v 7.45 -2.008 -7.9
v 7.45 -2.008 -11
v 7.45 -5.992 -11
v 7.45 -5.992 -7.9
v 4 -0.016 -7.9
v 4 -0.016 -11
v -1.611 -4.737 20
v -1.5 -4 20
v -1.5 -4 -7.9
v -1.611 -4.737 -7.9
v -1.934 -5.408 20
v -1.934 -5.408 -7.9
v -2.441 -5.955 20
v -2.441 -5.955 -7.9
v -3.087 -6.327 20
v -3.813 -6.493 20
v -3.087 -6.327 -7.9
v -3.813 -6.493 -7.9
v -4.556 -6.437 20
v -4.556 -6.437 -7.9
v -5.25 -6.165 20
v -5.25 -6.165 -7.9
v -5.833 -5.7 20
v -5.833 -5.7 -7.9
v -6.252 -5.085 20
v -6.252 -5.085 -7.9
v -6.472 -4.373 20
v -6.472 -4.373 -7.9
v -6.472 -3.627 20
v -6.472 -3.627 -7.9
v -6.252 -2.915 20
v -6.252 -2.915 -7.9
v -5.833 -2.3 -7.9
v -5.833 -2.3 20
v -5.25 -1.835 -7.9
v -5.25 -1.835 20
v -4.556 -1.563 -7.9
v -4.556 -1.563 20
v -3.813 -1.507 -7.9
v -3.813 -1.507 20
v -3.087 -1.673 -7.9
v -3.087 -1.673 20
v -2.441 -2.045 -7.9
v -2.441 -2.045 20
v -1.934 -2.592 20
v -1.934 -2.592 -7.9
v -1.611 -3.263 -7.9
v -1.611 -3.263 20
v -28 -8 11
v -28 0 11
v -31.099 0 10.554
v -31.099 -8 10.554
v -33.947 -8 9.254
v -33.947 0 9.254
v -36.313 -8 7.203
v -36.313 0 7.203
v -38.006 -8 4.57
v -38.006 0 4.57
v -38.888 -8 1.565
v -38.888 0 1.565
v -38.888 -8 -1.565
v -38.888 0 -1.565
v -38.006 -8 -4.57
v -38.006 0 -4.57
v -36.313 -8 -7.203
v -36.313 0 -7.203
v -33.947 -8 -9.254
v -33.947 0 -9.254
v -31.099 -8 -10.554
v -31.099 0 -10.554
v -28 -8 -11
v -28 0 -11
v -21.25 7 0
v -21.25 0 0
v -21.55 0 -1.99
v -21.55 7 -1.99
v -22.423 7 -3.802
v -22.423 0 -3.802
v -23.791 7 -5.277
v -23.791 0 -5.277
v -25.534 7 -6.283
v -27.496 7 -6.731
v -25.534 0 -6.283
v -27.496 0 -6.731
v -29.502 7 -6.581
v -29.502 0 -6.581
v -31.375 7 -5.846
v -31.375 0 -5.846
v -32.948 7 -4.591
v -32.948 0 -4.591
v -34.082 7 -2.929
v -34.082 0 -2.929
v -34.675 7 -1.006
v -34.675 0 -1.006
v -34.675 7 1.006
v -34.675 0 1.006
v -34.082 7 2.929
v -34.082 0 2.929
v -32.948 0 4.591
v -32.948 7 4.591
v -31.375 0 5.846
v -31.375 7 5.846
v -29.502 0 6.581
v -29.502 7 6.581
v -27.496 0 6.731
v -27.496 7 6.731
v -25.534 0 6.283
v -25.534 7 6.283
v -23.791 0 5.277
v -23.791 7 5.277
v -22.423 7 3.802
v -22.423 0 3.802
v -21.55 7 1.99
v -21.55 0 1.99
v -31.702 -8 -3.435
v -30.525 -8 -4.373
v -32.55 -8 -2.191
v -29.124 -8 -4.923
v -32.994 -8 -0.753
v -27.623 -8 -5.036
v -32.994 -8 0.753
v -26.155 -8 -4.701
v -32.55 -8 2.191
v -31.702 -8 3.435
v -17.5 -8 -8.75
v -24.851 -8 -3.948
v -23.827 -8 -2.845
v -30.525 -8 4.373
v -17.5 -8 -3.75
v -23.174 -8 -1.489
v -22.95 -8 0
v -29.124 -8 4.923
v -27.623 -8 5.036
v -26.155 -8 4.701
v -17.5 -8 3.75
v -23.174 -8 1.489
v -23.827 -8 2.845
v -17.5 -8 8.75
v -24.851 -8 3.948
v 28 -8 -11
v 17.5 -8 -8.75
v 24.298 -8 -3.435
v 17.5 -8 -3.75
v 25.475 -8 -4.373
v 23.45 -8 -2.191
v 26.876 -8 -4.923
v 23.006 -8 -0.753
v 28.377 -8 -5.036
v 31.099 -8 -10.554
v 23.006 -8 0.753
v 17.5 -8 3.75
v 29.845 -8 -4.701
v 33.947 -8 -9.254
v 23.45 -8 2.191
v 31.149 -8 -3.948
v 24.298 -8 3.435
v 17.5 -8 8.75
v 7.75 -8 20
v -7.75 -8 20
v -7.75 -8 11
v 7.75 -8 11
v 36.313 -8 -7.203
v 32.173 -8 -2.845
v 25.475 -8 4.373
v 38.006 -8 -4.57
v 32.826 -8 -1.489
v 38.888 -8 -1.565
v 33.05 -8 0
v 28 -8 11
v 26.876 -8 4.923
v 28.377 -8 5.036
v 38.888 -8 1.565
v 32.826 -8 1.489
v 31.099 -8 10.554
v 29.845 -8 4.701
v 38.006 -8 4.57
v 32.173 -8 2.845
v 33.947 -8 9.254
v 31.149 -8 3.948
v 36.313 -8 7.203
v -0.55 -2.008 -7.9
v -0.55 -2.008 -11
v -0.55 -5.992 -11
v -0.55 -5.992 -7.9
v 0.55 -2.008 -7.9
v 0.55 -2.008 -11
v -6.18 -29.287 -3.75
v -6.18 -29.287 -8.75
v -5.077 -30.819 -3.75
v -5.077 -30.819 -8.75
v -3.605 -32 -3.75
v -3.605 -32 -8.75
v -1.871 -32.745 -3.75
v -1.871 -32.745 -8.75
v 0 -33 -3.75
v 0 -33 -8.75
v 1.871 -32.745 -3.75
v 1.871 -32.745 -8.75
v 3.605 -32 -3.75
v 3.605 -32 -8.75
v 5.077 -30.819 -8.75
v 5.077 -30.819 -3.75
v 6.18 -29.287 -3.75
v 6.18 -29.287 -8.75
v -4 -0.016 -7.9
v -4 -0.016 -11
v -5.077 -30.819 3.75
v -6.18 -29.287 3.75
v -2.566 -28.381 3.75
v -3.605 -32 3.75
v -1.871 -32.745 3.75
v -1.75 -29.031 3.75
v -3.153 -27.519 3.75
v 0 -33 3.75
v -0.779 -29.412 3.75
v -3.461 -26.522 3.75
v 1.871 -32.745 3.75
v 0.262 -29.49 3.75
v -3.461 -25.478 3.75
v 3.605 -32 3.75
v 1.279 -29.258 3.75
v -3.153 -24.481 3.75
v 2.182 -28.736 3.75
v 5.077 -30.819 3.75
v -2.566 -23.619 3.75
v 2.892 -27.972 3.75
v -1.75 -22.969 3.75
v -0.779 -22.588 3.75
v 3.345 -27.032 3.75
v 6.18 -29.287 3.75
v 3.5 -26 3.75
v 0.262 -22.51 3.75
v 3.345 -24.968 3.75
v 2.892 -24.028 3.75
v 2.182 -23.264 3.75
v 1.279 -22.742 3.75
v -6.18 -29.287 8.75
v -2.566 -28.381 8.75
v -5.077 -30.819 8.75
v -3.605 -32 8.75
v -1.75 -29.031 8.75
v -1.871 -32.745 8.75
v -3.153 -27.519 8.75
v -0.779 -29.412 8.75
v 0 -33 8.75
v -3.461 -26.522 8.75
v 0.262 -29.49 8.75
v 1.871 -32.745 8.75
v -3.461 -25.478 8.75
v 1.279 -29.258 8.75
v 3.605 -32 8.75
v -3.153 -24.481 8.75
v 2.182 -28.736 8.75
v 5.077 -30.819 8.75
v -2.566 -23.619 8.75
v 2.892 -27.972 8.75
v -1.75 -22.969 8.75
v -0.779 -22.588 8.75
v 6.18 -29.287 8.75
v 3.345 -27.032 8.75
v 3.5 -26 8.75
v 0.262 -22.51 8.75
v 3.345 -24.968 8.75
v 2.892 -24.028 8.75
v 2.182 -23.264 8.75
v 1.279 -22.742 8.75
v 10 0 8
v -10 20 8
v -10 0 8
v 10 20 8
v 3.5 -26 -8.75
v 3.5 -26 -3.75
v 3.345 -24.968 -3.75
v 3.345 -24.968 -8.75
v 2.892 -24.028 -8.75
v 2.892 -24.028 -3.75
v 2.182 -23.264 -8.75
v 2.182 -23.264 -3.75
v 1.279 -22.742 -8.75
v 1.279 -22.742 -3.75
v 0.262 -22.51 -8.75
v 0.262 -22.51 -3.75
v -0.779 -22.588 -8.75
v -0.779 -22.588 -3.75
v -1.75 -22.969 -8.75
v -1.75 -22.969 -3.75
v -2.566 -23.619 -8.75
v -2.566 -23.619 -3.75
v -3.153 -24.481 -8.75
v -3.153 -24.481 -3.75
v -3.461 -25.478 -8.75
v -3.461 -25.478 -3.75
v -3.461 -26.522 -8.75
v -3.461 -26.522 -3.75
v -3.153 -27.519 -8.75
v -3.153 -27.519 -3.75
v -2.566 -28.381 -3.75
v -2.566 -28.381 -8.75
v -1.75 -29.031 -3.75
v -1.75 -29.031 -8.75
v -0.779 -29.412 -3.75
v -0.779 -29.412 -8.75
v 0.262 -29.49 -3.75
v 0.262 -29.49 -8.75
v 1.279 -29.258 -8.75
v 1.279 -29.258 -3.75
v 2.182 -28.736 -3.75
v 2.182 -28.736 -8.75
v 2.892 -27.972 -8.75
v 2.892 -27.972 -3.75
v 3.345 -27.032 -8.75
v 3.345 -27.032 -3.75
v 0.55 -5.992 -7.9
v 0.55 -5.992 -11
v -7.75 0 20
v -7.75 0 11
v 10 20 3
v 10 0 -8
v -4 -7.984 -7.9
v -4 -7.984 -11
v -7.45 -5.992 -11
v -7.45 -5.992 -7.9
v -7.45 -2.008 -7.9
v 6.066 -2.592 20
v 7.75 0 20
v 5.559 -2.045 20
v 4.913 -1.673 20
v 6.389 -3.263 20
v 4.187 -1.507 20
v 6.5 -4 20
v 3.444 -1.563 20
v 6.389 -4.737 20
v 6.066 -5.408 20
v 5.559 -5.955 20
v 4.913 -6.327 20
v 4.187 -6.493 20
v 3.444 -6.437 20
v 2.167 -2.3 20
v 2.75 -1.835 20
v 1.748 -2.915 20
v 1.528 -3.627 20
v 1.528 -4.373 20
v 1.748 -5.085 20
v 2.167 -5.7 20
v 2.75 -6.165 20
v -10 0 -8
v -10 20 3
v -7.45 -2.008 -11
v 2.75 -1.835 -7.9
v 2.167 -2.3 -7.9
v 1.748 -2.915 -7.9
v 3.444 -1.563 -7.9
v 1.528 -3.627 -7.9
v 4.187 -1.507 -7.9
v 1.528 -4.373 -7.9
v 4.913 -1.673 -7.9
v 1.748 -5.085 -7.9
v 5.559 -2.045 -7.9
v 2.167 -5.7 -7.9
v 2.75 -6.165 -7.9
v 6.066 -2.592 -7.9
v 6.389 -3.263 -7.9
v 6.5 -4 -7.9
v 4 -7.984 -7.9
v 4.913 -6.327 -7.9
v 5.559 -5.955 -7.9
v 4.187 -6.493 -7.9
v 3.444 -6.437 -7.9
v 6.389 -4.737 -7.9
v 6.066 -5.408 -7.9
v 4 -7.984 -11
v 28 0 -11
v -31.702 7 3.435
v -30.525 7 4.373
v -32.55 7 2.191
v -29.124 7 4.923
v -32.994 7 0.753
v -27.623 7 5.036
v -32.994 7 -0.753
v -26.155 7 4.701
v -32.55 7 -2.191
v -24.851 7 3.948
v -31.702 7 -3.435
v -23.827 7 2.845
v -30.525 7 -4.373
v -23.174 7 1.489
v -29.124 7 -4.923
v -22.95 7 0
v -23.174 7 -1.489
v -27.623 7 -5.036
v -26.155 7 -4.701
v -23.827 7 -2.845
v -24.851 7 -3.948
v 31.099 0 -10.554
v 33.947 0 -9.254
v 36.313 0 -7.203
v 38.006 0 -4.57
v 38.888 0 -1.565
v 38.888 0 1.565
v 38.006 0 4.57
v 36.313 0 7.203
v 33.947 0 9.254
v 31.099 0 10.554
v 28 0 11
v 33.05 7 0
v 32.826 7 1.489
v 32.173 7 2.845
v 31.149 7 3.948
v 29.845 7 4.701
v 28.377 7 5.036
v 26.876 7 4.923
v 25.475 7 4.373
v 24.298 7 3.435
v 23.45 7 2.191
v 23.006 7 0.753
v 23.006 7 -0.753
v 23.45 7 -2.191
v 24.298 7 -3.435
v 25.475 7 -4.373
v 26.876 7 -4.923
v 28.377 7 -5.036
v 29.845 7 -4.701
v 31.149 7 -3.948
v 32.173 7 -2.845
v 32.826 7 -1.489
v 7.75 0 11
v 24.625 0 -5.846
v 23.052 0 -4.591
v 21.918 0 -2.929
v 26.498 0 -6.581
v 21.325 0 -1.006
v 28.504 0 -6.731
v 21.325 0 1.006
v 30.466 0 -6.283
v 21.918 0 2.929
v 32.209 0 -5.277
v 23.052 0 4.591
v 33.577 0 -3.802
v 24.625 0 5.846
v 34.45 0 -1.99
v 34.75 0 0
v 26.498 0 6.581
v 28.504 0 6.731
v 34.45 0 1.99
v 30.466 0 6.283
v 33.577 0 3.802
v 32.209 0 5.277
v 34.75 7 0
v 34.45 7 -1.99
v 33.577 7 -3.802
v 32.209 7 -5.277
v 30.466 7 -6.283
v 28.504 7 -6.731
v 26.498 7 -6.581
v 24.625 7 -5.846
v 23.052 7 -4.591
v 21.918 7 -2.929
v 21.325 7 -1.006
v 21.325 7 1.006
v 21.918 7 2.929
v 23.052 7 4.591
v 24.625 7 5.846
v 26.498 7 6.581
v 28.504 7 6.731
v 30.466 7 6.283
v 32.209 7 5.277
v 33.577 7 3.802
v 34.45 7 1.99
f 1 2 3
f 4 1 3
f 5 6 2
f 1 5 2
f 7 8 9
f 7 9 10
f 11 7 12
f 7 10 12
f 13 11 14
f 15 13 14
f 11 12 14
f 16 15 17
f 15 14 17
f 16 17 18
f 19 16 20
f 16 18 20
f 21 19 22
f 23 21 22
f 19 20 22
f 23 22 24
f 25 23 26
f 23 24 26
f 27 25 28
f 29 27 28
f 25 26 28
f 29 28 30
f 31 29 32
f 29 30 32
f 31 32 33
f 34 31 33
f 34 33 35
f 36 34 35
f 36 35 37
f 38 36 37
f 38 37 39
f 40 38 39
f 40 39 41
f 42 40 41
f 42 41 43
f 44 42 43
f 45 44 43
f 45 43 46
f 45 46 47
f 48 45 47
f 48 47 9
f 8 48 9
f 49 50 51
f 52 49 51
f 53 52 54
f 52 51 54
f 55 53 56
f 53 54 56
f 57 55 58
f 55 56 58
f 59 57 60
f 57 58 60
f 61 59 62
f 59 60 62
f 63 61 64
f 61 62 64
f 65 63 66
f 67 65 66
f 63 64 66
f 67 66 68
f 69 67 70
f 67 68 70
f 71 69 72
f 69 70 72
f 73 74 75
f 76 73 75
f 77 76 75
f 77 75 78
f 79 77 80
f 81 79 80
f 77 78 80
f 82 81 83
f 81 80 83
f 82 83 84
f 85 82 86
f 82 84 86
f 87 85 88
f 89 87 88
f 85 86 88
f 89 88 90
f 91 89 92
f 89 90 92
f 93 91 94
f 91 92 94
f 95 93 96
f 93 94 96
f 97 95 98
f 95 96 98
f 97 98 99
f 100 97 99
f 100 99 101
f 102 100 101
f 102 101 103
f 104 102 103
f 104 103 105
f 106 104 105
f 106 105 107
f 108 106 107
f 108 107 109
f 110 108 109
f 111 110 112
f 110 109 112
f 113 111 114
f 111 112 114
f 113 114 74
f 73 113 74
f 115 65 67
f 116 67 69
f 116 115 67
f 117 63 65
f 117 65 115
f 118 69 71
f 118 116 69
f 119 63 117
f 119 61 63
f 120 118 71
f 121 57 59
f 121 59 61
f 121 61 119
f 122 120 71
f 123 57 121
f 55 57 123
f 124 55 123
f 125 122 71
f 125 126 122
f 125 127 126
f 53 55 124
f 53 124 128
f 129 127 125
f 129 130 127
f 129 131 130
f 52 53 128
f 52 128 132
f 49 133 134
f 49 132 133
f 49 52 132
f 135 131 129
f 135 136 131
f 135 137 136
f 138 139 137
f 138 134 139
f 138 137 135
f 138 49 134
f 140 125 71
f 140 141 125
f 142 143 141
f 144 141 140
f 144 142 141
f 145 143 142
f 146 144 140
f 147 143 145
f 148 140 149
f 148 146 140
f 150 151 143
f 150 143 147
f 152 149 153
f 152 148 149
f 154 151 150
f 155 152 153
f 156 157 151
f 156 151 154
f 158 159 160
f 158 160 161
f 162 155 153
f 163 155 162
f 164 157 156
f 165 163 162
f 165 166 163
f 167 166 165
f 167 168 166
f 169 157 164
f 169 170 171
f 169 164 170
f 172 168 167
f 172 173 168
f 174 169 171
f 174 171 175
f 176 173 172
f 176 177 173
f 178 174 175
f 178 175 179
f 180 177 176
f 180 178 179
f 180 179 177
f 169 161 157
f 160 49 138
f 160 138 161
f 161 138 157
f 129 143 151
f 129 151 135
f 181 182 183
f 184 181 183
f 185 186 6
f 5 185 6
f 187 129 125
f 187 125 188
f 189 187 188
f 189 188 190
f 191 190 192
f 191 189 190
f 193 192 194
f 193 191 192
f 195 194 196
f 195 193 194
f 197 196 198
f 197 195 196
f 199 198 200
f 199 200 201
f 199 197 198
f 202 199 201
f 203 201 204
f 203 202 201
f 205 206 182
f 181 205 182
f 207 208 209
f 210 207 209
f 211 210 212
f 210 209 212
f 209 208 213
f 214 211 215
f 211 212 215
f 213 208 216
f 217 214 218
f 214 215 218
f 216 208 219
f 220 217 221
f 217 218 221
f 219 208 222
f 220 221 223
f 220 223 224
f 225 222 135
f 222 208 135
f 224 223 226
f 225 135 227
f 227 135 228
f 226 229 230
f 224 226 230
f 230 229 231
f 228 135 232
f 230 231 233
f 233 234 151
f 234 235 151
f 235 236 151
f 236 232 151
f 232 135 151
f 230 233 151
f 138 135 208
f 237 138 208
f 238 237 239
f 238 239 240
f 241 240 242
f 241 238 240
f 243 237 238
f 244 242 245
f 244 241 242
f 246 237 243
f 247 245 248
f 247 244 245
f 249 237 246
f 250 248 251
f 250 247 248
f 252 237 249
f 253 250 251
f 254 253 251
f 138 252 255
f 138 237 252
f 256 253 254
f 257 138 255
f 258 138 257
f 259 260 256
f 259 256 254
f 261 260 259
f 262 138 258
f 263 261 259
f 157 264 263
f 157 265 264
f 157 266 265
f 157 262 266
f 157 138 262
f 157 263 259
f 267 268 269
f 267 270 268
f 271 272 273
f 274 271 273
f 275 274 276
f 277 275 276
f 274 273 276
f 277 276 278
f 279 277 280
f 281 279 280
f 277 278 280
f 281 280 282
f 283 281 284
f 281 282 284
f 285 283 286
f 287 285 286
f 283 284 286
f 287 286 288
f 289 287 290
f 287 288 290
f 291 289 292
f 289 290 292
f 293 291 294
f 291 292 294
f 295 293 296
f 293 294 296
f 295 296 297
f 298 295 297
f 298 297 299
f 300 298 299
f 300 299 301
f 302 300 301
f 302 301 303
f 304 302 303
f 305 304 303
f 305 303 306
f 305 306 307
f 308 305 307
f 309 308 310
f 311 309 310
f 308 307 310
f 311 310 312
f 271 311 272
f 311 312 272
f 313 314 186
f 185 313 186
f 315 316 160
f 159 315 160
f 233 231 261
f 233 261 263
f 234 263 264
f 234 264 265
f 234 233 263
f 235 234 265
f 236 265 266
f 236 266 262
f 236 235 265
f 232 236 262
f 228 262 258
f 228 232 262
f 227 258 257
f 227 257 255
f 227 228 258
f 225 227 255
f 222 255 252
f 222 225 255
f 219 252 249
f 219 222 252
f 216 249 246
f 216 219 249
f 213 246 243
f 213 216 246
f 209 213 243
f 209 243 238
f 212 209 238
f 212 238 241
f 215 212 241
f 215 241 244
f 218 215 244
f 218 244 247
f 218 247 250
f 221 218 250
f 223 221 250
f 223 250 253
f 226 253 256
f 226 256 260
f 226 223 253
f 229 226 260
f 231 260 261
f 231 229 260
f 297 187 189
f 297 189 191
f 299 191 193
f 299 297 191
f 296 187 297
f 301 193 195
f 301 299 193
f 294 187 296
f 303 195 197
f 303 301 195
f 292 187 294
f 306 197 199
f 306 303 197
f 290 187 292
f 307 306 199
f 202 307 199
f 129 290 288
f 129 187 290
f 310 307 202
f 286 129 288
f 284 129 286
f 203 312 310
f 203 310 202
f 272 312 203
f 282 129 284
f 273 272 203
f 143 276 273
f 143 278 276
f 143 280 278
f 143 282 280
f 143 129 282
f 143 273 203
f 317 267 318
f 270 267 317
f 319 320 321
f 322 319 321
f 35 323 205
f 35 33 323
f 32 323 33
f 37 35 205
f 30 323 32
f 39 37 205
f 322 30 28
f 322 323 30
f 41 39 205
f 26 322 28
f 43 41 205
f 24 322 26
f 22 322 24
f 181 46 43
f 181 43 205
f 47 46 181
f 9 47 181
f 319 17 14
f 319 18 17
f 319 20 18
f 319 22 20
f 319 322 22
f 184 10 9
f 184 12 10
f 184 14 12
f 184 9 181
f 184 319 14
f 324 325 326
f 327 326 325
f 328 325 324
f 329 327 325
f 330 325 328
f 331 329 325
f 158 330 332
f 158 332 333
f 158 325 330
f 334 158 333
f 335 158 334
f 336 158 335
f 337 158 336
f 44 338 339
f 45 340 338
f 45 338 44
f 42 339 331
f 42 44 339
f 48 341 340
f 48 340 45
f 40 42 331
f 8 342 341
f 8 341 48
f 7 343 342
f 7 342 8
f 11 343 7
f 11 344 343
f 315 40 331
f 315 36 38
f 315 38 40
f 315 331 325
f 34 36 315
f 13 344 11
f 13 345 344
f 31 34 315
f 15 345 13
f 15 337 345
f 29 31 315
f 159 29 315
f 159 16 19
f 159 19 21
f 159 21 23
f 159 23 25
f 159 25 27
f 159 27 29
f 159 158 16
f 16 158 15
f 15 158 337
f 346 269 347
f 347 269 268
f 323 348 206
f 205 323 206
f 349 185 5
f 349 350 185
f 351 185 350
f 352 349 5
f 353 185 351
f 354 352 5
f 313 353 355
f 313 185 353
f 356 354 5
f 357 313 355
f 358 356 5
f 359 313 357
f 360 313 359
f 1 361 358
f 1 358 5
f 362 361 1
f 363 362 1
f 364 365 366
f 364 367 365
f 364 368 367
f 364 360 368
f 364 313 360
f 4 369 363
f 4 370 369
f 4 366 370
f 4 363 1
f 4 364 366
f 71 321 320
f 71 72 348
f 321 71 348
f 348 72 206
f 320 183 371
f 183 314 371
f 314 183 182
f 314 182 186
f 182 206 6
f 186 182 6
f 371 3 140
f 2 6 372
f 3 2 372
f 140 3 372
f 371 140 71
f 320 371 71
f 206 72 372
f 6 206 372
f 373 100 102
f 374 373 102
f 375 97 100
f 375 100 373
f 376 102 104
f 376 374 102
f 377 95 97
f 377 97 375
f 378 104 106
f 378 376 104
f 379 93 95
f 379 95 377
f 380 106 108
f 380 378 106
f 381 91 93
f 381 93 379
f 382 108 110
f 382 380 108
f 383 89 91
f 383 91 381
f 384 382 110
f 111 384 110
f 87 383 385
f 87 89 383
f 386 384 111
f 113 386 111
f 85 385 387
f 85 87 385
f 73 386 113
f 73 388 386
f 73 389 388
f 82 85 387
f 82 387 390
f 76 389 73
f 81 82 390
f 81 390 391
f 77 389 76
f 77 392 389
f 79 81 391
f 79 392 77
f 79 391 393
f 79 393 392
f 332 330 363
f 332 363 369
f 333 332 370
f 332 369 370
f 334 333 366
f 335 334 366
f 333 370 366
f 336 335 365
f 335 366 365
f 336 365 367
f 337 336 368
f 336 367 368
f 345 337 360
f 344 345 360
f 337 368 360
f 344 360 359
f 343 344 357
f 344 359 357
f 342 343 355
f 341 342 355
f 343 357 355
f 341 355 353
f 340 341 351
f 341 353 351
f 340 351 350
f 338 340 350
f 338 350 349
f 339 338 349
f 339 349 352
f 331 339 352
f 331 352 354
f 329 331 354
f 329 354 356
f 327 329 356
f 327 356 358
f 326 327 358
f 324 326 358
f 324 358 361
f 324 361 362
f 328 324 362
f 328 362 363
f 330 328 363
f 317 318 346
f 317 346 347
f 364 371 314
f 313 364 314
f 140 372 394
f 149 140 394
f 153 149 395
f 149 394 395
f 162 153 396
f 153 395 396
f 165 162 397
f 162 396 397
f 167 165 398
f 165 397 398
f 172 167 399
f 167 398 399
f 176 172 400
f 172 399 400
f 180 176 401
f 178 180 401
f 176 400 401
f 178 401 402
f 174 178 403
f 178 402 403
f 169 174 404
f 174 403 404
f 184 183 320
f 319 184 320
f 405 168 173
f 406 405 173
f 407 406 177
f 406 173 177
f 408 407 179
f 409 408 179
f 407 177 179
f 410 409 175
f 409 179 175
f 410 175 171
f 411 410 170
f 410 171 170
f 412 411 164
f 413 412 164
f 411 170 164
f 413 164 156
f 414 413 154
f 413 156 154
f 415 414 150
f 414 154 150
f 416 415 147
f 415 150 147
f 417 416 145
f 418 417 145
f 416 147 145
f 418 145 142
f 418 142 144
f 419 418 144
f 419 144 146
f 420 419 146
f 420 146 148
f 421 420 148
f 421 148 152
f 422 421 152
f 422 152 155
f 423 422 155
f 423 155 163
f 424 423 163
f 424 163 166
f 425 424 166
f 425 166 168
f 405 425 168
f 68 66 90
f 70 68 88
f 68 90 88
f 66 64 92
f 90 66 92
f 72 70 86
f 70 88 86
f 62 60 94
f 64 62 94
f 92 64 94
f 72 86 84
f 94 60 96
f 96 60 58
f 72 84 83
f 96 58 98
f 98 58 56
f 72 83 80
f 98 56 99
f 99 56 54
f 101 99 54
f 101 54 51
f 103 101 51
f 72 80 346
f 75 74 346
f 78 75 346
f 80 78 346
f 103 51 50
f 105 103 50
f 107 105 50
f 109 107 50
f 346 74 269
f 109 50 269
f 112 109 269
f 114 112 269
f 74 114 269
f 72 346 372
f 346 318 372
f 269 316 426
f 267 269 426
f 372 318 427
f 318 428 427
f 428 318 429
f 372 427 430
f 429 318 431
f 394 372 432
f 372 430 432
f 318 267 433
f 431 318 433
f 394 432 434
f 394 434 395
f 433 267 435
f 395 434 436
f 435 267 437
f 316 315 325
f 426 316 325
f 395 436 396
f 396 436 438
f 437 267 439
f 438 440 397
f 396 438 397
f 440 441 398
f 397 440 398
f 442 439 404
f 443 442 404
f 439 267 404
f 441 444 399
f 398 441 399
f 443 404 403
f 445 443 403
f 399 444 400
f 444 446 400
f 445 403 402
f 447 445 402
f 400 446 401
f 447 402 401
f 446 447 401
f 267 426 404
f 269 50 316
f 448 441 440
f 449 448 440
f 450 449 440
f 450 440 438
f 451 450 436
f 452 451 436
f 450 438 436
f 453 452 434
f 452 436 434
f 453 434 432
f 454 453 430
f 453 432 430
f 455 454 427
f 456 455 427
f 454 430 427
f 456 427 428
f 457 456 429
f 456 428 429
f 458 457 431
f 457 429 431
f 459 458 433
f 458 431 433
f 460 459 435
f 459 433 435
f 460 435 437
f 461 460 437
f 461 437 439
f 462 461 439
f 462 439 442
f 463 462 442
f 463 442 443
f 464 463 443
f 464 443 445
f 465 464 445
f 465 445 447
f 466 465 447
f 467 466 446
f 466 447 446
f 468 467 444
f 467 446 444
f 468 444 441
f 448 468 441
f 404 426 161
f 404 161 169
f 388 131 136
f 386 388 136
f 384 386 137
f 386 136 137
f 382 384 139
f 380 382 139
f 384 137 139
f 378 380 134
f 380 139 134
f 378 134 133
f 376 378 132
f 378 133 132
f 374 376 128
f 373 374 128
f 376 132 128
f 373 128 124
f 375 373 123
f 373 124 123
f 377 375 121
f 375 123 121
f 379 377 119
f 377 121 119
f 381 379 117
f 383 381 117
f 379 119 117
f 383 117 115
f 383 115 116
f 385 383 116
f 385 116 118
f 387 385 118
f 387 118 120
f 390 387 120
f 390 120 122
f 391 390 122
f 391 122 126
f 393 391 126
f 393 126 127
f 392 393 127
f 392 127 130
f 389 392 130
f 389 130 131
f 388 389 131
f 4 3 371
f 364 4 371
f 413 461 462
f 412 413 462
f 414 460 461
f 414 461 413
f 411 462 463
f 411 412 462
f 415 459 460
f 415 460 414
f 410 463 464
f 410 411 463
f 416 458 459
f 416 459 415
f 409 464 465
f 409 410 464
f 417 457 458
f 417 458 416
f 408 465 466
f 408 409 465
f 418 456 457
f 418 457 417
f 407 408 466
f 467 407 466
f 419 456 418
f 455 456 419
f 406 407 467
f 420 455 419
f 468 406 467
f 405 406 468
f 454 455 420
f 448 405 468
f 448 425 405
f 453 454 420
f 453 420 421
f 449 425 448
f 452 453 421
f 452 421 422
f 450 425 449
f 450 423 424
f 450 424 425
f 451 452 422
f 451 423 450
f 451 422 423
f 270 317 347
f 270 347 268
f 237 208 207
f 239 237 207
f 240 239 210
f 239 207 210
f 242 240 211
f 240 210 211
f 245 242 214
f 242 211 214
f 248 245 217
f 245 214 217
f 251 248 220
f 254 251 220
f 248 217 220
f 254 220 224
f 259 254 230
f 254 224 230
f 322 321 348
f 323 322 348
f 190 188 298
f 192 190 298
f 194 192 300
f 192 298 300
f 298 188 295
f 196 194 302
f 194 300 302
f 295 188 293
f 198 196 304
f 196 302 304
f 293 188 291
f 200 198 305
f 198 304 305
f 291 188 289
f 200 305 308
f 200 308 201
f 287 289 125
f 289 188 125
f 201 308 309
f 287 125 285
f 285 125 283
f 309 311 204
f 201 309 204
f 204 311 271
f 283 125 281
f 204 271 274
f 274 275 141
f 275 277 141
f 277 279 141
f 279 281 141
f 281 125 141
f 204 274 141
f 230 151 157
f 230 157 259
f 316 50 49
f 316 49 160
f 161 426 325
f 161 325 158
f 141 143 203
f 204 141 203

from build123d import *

# Parameters (mm, degrees)
PAD_DEPTH       = 8
SKETCH001_R     = 6.75
PAD001_DEPTH    = 7
SKETCH002_R     = 5.05
POCKET_DEPTH    = 15.001
SKETCH003_R     = 3.5
PAD002_DEPTH    = 5
PAD003_DEPTH    = 10
SKETCH005_W     = 15.5
SKETCH005_H     = 8
PAD004_DEPTH    = 9
SKETCH006_R     = 2.5
POCKET001_DEPTH = 31.001
POCKET002_DEPTH = 3.1


with BuildPart() as part:
    # Sketch → Pad (new body)
    with BuildSketch(Plane.XZ):
        with BuildLine():
            ThreePointArc((-28, 11), (-39, 0), (-28, -11))
            Line((-28, -11), (28, -11))
            ThreePointArc((28, -11), (39, 0), (28, 11))
            Line((-28, 11), (28, 11))
        make_face()
    extrude(amount=PAD_DEPTH)

    # Sketch001 (on Face5 of Pad) → Pad001 (join)
    with BuildSketch(Plane(origin=(0, 0, 0), x_dir=(1, 0, 0), z_dir=(0, 1, 0))):
        with Locations((-28, 0)):
            Circle(SKETCH001_R)
        with Locations((28, 0)):
            Circle(SKETCH001_R)
    extrude(amount=PAD001_DEPTH)

    # Sketch002 (on Face5 of Pad001) → Pocket (cut, through all)
    with BuildSketch(Plane.XZ.offset(8)):
        with Locations((-28, 0)):
            Circle(SKETCH002_R)
        with Locations((28, 0)):
            Circle(SKETCH002_R)
    extrude(amount=-POCKET_DEPTH, mode=Mode.SUBTRACT)

    # Sketch003 (on DatumPlane) → Pad002 (join)
    with BuildSketch(Plane.XY.offset(3.75)):
        with BuildLine():
            Line((-17.5, -8), (-6.180484, -29.286582))
            ThreePointArc((-6.180484, -29.286582), (0, -33), (6.180484, -29.286582))
            Line((17.5, -8), (6.180484, -29.286582))
            Line((-17.5, -8), (17.5, -8))
        make_face()
        with Locations((0, -26)):
            Circle(SKETCH003_R, mode=Mode.SUBTRACT)
    pad002 = extrude(amount=PAD002_DEPTH)

    # Mirrored: Pad002 across XY
    add(pad002.mirror(Plane.XY))

    # Sketch004 → Pad003 (join, symmetric)
    with BuildSketch(Plane.YZ):
        Polygon((0, 8), (0, -8), (20, 3), (20, 8), align=None)
    extrude(amount=PAD003_DEPTH, both=True)

    # Sketch005 (on Face2 of Pad003) → Pad004 (join)
    with BuildSketch(Plane(origin=(0, 0, 11), x_dir=(-1, 0, 0), z_dir=(0, 0, 1))):
        with Locations((0, 4)):
            Rectangle(SKETCH005_W, SKETCH005_H)
    extrude(amount=PAD004_DEPTH)

    # Sketch006 (on Face3 of Pad004) → Pocket001 (cut, through all)
    with BuildSketch(Plane(origin=(0, 0, -11), x_dir=(1, 0, 0), z_dir=(0, 0, -1))):
        with Locations((-4, 4)):
            Circle(SKETCH006_R)
        with Locations((4, 4)):
            Circle(SKETCH006_R)
    extrude(amount=-POCKET001_DEPTH, mode=Mode.SUBTRACT)

    # Sketch007 (on Face3 of Pocket001) → Pocket002 (cut)
    with BuildSketch(Plane(origin=(0, 0, -11), x_dir=(1, 0, 0), z_dir=(0, 0, -1))):
        Polygon((-0.55, 5.991858), (-4, 7.983717), (-7.45, 5.991858), (-7.45, 2.008142), (-4, 0.016283), (-0.55, 2.008142), align=None)
        Polygon((4, 7.983717), (0.55, 5.991858), (0.55, 2.008142), (4, 0.016283), (7.45, 2.008142), (7.45, 5.991858), align=None)
    extrude(amount=-POCKET002_DEPTH, mode=Mode.SUBTRACT)


solid = part.part
